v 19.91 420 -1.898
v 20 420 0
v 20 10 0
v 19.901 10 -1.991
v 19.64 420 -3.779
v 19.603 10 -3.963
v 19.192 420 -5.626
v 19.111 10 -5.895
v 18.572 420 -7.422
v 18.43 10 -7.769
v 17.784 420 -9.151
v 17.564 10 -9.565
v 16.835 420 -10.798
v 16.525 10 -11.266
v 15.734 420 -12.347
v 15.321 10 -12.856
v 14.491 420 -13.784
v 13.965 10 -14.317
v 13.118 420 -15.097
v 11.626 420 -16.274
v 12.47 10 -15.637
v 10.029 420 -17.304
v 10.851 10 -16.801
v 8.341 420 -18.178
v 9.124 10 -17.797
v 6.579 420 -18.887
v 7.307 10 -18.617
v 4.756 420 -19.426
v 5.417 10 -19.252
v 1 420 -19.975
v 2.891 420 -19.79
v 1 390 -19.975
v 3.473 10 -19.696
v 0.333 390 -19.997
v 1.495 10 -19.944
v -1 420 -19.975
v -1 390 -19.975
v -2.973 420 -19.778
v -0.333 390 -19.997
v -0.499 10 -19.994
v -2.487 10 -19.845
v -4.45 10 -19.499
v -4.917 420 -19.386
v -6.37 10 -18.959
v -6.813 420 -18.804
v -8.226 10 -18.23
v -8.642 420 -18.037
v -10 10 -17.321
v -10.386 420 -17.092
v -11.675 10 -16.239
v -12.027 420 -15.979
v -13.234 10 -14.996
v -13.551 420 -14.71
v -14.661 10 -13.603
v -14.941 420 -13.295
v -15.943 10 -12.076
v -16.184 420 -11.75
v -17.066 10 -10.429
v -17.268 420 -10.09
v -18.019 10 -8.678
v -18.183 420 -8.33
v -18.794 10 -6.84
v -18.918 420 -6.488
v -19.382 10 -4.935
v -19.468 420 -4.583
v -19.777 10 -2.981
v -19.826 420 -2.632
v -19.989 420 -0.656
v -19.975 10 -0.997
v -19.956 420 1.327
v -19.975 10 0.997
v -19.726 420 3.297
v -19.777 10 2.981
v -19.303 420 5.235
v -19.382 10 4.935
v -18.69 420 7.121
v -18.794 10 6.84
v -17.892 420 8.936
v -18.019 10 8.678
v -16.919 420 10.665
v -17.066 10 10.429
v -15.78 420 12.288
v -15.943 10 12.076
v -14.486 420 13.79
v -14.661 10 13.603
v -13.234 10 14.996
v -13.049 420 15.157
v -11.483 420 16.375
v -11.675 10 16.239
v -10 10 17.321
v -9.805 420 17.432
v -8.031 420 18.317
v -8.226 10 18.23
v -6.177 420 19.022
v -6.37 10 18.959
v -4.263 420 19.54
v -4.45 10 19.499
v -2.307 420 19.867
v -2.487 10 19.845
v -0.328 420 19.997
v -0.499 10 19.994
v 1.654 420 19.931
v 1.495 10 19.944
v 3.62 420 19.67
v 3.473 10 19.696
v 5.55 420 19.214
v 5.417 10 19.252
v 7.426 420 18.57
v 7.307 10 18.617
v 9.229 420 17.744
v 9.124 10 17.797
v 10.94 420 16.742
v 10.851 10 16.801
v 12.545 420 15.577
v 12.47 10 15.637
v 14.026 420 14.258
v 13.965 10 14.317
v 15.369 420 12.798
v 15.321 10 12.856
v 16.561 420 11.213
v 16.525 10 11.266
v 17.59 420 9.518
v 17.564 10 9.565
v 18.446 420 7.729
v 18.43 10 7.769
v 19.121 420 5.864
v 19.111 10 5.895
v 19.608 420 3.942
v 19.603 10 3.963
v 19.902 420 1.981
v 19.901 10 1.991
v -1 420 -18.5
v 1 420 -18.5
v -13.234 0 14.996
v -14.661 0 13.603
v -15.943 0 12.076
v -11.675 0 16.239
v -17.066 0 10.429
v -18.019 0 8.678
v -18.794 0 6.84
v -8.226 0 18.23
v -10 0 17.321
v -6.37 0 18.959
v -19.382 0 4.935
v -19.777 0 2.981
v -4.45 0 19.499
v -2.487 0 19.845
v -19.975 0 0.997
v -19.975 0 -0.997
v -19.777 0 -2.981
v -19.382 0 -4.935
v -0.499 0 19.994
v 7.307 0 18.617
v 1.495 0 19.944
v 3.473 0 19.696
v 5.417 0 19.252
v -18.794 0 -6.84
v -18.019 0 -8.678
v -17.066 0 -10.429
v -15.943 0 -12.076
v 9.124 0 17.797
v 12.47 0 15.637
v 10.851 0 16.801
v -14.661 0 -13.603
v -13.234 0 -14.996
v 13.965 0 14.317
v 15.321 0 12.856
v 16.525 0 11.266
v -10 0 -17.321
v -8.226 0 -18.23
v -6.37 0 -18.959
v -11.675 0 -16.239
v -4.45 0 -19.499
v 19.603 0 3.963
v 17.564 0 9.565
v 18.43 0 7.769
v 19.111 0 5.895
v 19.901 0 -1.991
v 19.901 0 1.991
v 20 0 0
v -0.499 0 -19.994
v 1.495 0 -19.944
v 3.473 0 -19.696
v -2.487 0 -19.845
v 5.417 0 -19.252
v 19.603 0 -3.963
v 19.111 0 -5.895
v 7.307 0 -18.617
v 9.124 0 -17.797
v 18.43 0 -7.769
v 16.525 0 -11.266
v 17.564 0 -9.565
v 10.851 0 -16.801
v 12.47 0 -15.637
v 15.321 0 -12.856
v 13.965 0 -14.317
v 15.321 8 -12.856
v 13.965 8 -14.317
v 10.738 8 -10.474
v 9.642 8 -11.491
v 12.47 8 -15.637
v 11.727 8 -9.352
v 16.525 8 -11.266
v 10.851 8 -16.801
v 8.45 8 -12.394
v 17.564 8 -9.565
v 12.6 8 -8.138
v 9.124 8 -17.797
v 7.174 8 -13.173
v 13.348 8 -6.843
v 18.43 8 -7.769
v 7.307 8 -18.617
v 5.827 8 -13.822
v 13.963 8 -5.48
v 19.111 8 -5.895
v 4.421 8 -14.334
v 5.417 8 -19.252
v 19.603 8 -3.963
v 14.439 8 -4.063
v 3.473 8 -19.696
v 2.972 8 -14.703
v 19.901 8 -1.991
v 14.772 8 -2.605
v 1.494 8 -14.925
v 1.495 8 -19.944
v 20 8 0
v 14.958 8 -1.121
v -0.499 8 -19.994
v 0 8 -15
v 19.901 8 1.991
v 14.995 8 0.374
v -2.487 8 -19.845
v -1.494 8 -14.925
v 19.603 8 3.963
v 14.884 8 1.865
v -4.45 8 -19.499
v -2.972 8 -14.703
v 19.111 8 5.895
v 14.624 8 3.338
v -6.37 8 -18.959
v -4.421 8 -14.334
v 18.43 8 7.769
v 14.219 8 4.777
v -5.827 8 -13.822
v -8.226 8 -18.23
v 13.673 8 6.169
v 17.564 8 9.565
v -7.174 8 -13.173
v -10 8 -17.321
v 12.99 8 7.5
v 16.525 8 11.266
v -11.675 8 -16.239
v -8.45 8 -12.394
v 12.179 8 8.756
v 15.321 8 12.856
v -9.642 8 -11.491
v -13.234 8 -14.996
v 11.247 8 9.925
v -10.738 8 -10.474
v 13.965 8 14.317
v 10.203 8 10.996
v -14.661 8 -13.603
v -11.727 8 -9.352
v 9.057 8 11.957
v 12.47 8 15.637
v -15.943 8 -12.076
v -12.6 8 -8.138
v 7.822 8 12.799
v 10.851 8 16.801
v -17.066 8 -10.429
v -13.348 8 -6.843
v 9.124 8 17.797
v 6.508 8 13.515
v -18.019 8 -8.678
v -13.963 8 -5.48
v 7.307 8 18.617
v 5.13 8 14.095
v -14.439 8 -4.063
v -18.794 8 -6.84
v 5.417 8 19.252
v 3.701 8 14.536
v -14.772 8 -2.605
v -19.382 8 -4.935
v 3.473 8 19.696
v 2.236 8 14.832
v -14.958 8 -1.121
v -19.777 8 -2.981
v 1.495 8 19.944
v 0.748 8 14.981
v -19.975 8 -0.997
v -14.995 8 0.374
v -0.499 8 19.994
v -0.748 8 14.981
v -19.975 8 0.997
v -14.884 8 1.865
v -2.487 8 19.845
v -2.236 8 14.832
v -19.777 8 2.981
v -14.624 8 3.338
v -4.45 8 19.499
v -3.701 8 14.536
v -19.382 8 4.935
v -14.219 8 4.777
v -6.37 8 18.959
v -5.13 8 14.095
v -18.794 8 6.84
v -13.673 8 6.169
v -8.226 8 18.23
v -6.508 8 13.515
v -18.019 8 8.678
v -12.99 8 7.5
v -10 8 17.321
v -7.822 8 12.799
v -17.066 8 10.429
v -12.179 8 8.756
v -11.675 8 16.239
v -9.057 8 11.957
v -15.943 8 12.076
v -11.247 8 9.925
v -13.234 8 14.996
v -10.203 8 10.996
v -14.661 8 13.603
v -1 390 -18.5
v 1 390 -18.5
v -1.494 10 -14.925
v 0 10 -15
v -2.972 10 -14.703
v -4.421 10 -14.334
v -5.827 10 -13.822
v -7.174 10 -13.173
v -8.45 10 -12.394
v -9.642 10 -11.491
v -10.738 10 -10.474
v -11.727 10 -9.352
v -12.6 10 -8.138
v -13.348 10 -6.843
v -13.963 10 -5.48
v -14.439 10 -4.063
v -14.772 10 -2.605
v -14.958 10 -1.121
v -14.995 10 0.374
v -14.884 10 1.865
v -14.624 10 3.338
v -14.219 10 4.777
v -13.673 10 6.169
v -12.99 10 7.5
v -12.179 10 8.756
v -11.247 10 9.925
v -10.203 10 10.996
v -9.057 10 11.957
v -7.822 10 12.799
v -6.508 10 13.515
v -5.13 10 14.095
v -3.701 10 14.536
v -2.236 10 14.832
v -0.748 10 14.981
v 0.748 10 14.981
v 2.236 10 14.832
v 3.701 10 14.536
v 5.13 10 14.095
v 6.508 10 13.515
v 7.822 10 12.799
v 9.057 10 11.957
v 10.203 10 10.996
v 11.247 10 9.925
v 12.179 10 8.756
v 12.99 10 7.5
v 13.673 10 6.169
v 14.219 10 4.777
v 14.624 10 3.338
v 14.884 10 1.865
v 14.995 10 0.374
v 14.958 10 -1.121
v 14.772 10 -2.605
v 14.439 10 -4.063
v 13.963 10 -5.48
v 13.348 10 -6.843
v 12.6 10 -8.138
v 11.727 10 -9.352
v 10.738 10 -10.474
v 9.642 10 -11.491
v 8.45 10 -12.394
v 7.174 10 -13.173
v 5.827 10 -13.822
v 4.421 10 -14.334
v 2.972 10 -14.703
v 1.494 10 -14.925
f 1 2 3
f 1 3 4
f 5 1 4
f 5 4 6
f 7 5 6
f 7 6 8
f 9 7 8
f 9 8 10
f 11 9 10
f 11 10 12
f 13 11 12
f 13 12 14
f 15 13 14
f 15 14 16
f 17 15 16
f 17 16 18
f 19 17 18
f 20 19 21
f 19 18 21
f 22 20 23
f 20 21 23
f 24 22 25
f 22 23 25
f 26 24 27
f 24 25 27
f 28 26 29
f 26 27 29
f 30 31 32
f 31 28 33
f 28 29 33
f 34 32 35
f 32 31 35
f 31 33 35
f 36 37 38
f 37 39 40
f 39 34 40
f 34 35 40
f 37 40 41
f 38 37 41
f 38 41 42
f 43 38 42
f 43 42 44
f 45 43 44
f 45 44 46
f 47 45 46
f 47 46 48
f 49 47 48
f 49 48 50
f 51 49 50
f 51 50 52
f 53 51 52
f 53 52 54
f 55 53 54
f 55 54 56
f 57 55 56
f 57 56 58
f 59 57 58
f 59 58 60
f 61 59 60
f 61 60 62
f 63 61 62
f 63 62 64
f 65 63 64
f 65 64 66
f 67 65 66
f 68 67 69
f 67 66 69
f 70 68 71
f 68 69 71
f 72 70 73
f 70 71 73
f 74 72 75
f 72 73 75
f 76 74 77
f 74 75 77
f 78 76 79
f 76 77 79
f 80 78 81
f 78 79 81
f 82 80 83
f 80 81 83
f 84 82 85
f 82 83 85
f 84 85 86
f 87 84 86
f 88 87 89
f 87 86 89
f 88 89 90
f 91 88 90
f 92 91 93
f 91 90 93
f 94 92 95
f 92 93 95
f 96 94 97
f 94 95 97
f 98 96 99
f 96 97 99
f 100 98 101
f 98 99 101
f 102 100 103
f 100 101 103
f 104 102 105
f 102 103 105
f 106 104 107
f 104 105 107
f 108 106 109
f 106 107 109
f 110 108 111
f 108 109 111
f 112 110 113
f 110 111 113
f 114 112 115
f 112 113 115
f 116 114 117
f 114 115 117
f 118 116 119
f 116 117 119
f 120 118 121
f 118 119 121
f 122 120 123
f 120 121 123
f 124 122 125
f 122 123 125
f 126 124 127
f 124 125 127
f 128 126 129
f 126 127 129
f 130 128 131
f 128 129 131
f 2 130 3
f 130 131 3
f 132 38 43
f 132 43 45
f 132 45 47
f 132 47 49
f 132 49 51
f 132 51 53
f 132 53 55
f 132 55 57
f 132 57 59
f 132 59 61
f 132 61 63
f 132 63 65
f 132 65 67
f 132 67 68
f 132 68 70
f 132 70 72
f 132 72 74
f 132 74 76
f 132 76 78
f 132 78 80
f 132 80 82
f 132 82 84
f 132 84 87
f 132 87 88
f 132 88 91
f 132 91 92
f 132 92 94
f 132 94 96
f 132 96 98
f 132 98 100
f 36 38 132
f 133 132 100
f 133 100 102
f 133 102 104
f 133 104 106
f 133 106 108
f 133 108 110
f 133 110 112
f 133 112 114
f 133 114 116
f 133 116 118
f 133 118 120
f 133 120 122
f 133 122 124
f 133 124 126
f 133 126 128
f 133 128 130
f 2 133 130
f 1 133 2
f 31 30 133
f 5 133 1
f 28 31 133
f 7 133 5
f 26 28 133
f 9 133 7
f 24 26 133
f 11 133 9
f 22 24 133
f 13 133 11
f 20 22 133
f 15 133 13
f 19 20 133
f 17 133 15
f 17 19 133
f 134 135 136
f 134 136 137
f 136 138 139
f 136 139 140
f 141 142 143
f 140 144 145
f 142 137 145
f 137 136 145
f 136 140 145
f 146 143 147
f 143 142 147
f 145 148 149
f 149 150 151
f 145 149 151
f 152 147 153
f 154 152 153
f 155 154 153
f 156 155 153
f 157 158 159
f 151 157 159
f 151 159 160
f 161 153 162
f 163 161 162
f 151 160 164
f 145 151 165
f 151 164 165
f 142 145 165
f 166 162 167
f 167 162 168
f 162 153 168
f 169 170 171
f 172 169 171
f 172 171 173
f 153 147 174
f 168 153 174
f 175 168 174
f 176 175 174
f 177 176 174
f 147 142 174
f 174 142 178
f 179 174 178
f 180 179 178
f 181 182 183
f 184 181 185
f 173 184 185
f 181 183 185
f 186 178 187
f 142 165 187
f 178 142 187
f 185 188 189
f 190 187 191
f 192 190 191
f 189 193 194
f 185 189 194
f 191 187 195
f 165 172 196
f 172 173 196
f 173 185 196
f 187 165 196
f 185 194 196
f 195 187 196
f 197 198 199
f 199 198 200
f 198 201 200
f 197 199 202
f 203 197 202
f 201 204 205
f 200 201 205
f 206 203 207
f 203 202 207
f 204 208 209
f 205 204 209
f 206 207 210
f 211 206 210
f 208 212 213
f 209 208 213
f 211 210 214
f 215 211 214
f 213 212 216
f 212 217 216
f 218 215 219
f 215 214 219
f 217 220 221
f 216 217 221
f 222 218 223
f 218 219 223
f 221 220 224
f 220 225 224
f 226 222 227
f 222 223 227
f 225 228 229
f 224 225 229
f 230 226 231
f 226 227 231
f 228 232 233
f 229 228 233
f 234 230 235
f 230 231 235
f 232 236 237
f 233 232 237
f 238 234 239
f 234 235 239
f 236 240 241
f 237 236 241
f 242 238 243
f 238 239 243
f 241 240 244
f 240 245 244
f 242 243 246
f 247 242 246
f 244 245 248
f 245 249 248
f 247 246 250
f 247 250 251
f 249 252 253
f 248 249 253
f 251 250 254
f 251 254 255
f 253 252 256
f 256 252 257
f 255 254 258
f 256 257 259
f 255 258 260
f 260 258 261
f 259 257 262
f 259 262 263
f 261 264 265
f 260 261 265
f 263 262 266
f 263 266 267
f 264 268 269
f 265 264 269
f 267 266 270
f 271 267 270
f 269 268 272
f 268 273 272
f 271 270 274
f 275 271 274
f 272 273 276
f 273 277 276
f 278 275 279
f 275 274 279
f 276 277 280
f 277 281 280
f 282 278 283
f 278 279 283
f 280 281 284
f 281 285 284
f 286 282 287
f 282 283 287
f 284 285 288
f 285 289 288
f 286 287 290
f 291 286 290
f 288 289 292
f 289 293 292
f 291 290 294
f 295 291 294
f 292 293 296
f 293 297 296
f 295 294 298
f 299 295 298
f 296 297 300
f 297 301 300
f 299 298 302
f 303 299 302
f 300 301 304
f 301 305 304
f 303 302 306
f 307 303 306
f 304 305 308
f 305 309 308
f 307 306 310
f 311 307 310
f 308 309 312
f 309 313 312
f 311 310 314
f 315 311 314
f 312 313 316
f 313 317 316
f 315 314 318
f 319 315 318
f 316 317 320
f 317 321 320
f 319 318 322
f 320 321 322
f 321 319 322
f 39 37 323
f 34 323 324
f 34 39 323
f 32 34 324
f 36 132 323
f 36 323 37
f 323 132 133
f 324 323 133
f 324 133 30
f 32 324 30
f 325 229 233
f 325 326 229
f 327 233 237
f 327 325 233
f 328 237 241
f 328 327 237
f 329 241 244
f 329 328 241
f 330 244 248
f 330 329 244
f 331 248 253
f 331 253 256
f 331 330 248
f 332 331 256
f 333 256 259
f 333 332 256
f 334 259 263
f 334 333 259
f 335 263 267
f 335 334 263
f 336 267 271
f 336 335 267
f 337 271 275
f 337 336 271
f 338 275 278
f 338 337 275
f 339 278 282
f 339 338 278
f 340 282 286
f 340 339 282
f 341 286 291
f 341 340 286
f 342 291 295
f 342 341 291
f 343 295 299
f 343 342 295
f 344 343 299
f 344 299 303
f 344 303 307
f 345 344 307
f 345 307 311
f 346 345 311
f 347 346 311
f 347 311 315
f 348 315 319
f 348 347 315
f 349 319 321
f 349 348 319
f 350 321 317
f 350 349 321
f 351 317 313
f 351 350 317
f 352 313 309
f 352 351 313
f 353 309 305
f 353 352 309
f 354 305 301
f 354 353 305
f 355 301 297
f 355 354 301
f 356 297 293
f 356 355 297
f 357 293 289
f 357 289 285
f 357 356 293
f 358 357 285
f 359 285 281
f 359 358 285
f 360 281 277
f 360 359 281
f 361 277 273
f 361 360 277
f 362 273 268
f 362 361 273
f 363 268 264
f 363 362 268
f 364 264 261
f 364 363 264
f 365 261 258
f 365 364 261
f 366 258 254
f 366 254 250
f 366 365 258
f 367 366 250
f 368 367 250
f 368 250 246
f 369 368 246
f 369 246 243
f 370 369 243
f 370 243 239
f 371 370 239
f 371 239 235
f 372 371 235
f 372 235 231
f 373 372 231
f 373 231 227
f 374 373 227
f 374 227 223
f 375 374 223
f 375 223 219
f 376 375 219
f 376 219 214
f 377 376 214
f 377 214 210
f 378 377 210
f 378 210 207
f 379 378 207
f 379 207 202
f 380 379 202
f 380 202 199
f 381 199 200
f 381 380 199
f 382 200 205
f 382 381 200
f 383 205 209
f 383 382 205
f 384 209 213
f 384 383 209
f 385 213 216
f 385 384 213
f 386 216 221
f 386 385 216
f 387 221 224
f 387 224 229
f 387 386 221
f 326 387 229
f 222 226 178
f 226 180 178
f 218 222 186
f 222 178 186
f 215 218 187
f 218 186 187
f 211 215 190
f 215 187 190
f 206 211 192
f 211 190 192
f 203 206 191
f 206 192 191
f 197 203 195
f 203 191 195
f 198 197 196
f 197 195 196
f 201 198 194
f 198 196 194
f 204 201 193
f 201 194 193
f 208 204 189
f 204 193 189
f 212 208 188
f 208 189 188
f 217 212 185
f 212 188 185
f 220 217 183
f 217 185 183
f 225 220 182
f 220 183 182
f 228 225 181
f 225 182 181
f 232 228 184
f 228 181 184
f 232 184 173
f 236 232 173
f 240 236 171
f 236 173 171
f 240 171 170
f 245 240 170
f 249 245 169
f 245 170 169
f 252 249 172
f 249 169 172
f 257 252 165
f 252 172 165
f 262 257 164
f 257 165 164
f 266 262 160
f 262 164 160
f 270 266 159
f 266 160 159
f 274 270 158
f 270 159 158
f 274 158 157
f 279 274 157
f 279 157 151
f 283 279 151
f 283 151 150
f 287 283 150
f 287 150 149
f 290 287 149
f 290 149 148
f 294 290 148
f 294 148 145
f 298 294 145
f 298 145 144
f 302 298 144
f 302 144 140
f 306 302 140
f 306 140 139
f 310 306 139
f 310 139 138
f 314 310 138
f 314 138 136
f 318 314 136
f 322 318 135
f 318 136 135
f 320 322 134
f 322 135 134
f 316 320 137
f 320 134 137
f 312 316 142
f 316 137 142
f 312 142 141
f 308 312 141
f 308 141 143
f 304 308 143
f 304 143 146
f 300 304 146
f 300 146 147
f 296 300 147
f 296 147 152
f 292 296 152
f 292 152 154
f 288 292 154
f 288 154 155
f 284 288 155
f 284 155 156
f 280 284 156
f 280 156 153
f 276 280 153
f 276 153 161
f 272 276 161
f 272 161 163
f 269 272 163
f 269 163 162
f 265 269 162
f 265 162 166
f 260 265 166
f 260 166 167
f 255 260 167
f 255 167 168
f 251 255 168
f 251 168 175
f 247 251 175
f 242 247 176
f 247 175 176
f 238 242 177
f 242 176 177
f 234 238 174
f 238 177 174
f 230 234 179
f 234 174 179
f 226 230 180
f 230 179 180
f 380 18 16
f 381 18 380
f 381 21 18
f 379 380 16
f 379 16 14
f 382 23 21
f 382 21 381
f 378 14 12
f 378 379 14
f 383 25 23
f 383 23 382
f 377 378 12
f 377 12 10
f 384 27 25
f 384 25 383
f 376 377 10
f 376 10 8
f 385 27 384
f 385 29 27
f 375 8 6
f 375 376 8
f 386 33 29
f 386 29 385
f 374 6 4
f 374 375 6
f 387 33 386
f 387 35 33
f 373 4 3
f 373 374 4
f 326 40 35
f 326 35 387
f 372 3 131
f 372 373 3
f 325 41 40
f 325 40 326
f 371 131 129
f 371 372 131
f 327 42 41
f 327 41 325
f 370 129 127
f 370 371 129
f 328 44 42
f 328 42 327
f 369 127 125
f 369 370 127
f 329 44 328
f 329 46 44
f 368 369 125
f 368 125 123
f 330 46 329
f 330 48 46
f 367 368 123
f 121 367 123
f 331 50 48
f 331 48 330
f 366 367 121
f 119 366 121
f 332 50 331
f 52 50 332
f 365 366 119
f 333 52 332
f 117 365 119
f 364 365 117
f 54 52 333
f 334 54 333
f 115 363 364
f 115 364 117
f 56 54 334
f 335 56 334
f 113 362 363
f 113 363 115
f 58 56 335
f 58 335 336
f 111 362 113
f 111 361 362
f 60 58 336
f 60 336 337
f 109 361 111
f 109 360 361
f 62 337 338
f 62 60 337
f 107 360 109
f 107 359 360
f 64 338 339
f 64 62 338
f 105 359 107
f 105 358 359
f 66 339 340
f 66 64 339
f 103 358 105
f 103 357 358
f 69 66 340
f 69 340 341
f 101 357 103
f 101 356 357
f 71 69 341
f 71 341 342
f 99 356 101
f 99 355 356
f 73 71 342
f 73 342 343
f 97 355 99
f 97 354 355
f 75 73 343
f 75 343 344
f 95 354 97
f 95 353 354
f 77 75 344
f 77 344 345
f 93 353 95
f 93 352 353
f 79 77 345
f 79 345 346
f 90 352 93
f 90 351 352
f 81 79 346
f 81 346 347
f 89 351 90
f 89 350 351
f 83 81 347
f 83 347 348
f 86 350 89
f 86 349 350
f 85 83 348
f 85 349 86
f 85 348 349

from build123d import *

# Parameters (mm, degrees)
SKETCH2_R           = 20
BOSS_EXTRUDE1_DEPTH = 420
SKETCH3_W           = 5
SKETCH3_H           = 2
SKETCH4_W           = 2
SKETCH4_H           = 1.5
CUT_EXTRUDE2_DEPTH  = 30


with BuildPart() as part:
    # Sketch2 → Boss-Extrude1 (new body)
    with BuildSketch(Plane(origin=(0, 0, 0), x_dir=(1, 0, 0), z_dir=(0, 1, 0))):
        Circle(SKETCH2_R)
    extrude(amount=BOSS_EXTRUDE1_DEPTH)

    # Sketch3 → Cut-Revolve1 (revolve, cut)
    with BuildSketch(Plane(origin=(0, 0, 0), x_dir=(0, 0, -1), z_dir=(1, 0, 0))):
        with Locations((17.5, 9)):
            Rectangle(SKETCH3_W, SKETCH3_H)
    revolve(axis=Axis((0, 0, 0), (0, 1, 0)), mode=Mode.SUBTRACT)

    # Sketch4 → Cut-Extrude2 (cut)
    with BuildSketch(Plane(origin=(0, 420, 0), x_dir=(1, 0, 0), z_dir=(0, 1, 0))):
        with Locations((0, 19.25)):
            Rectangle(SKETCH4_W, SKETCH4_H)
    extrude(amount=-CUT_EXTRUDE2_DEPTH, mode=Mode.SUBTRACT)


solid = part.part
